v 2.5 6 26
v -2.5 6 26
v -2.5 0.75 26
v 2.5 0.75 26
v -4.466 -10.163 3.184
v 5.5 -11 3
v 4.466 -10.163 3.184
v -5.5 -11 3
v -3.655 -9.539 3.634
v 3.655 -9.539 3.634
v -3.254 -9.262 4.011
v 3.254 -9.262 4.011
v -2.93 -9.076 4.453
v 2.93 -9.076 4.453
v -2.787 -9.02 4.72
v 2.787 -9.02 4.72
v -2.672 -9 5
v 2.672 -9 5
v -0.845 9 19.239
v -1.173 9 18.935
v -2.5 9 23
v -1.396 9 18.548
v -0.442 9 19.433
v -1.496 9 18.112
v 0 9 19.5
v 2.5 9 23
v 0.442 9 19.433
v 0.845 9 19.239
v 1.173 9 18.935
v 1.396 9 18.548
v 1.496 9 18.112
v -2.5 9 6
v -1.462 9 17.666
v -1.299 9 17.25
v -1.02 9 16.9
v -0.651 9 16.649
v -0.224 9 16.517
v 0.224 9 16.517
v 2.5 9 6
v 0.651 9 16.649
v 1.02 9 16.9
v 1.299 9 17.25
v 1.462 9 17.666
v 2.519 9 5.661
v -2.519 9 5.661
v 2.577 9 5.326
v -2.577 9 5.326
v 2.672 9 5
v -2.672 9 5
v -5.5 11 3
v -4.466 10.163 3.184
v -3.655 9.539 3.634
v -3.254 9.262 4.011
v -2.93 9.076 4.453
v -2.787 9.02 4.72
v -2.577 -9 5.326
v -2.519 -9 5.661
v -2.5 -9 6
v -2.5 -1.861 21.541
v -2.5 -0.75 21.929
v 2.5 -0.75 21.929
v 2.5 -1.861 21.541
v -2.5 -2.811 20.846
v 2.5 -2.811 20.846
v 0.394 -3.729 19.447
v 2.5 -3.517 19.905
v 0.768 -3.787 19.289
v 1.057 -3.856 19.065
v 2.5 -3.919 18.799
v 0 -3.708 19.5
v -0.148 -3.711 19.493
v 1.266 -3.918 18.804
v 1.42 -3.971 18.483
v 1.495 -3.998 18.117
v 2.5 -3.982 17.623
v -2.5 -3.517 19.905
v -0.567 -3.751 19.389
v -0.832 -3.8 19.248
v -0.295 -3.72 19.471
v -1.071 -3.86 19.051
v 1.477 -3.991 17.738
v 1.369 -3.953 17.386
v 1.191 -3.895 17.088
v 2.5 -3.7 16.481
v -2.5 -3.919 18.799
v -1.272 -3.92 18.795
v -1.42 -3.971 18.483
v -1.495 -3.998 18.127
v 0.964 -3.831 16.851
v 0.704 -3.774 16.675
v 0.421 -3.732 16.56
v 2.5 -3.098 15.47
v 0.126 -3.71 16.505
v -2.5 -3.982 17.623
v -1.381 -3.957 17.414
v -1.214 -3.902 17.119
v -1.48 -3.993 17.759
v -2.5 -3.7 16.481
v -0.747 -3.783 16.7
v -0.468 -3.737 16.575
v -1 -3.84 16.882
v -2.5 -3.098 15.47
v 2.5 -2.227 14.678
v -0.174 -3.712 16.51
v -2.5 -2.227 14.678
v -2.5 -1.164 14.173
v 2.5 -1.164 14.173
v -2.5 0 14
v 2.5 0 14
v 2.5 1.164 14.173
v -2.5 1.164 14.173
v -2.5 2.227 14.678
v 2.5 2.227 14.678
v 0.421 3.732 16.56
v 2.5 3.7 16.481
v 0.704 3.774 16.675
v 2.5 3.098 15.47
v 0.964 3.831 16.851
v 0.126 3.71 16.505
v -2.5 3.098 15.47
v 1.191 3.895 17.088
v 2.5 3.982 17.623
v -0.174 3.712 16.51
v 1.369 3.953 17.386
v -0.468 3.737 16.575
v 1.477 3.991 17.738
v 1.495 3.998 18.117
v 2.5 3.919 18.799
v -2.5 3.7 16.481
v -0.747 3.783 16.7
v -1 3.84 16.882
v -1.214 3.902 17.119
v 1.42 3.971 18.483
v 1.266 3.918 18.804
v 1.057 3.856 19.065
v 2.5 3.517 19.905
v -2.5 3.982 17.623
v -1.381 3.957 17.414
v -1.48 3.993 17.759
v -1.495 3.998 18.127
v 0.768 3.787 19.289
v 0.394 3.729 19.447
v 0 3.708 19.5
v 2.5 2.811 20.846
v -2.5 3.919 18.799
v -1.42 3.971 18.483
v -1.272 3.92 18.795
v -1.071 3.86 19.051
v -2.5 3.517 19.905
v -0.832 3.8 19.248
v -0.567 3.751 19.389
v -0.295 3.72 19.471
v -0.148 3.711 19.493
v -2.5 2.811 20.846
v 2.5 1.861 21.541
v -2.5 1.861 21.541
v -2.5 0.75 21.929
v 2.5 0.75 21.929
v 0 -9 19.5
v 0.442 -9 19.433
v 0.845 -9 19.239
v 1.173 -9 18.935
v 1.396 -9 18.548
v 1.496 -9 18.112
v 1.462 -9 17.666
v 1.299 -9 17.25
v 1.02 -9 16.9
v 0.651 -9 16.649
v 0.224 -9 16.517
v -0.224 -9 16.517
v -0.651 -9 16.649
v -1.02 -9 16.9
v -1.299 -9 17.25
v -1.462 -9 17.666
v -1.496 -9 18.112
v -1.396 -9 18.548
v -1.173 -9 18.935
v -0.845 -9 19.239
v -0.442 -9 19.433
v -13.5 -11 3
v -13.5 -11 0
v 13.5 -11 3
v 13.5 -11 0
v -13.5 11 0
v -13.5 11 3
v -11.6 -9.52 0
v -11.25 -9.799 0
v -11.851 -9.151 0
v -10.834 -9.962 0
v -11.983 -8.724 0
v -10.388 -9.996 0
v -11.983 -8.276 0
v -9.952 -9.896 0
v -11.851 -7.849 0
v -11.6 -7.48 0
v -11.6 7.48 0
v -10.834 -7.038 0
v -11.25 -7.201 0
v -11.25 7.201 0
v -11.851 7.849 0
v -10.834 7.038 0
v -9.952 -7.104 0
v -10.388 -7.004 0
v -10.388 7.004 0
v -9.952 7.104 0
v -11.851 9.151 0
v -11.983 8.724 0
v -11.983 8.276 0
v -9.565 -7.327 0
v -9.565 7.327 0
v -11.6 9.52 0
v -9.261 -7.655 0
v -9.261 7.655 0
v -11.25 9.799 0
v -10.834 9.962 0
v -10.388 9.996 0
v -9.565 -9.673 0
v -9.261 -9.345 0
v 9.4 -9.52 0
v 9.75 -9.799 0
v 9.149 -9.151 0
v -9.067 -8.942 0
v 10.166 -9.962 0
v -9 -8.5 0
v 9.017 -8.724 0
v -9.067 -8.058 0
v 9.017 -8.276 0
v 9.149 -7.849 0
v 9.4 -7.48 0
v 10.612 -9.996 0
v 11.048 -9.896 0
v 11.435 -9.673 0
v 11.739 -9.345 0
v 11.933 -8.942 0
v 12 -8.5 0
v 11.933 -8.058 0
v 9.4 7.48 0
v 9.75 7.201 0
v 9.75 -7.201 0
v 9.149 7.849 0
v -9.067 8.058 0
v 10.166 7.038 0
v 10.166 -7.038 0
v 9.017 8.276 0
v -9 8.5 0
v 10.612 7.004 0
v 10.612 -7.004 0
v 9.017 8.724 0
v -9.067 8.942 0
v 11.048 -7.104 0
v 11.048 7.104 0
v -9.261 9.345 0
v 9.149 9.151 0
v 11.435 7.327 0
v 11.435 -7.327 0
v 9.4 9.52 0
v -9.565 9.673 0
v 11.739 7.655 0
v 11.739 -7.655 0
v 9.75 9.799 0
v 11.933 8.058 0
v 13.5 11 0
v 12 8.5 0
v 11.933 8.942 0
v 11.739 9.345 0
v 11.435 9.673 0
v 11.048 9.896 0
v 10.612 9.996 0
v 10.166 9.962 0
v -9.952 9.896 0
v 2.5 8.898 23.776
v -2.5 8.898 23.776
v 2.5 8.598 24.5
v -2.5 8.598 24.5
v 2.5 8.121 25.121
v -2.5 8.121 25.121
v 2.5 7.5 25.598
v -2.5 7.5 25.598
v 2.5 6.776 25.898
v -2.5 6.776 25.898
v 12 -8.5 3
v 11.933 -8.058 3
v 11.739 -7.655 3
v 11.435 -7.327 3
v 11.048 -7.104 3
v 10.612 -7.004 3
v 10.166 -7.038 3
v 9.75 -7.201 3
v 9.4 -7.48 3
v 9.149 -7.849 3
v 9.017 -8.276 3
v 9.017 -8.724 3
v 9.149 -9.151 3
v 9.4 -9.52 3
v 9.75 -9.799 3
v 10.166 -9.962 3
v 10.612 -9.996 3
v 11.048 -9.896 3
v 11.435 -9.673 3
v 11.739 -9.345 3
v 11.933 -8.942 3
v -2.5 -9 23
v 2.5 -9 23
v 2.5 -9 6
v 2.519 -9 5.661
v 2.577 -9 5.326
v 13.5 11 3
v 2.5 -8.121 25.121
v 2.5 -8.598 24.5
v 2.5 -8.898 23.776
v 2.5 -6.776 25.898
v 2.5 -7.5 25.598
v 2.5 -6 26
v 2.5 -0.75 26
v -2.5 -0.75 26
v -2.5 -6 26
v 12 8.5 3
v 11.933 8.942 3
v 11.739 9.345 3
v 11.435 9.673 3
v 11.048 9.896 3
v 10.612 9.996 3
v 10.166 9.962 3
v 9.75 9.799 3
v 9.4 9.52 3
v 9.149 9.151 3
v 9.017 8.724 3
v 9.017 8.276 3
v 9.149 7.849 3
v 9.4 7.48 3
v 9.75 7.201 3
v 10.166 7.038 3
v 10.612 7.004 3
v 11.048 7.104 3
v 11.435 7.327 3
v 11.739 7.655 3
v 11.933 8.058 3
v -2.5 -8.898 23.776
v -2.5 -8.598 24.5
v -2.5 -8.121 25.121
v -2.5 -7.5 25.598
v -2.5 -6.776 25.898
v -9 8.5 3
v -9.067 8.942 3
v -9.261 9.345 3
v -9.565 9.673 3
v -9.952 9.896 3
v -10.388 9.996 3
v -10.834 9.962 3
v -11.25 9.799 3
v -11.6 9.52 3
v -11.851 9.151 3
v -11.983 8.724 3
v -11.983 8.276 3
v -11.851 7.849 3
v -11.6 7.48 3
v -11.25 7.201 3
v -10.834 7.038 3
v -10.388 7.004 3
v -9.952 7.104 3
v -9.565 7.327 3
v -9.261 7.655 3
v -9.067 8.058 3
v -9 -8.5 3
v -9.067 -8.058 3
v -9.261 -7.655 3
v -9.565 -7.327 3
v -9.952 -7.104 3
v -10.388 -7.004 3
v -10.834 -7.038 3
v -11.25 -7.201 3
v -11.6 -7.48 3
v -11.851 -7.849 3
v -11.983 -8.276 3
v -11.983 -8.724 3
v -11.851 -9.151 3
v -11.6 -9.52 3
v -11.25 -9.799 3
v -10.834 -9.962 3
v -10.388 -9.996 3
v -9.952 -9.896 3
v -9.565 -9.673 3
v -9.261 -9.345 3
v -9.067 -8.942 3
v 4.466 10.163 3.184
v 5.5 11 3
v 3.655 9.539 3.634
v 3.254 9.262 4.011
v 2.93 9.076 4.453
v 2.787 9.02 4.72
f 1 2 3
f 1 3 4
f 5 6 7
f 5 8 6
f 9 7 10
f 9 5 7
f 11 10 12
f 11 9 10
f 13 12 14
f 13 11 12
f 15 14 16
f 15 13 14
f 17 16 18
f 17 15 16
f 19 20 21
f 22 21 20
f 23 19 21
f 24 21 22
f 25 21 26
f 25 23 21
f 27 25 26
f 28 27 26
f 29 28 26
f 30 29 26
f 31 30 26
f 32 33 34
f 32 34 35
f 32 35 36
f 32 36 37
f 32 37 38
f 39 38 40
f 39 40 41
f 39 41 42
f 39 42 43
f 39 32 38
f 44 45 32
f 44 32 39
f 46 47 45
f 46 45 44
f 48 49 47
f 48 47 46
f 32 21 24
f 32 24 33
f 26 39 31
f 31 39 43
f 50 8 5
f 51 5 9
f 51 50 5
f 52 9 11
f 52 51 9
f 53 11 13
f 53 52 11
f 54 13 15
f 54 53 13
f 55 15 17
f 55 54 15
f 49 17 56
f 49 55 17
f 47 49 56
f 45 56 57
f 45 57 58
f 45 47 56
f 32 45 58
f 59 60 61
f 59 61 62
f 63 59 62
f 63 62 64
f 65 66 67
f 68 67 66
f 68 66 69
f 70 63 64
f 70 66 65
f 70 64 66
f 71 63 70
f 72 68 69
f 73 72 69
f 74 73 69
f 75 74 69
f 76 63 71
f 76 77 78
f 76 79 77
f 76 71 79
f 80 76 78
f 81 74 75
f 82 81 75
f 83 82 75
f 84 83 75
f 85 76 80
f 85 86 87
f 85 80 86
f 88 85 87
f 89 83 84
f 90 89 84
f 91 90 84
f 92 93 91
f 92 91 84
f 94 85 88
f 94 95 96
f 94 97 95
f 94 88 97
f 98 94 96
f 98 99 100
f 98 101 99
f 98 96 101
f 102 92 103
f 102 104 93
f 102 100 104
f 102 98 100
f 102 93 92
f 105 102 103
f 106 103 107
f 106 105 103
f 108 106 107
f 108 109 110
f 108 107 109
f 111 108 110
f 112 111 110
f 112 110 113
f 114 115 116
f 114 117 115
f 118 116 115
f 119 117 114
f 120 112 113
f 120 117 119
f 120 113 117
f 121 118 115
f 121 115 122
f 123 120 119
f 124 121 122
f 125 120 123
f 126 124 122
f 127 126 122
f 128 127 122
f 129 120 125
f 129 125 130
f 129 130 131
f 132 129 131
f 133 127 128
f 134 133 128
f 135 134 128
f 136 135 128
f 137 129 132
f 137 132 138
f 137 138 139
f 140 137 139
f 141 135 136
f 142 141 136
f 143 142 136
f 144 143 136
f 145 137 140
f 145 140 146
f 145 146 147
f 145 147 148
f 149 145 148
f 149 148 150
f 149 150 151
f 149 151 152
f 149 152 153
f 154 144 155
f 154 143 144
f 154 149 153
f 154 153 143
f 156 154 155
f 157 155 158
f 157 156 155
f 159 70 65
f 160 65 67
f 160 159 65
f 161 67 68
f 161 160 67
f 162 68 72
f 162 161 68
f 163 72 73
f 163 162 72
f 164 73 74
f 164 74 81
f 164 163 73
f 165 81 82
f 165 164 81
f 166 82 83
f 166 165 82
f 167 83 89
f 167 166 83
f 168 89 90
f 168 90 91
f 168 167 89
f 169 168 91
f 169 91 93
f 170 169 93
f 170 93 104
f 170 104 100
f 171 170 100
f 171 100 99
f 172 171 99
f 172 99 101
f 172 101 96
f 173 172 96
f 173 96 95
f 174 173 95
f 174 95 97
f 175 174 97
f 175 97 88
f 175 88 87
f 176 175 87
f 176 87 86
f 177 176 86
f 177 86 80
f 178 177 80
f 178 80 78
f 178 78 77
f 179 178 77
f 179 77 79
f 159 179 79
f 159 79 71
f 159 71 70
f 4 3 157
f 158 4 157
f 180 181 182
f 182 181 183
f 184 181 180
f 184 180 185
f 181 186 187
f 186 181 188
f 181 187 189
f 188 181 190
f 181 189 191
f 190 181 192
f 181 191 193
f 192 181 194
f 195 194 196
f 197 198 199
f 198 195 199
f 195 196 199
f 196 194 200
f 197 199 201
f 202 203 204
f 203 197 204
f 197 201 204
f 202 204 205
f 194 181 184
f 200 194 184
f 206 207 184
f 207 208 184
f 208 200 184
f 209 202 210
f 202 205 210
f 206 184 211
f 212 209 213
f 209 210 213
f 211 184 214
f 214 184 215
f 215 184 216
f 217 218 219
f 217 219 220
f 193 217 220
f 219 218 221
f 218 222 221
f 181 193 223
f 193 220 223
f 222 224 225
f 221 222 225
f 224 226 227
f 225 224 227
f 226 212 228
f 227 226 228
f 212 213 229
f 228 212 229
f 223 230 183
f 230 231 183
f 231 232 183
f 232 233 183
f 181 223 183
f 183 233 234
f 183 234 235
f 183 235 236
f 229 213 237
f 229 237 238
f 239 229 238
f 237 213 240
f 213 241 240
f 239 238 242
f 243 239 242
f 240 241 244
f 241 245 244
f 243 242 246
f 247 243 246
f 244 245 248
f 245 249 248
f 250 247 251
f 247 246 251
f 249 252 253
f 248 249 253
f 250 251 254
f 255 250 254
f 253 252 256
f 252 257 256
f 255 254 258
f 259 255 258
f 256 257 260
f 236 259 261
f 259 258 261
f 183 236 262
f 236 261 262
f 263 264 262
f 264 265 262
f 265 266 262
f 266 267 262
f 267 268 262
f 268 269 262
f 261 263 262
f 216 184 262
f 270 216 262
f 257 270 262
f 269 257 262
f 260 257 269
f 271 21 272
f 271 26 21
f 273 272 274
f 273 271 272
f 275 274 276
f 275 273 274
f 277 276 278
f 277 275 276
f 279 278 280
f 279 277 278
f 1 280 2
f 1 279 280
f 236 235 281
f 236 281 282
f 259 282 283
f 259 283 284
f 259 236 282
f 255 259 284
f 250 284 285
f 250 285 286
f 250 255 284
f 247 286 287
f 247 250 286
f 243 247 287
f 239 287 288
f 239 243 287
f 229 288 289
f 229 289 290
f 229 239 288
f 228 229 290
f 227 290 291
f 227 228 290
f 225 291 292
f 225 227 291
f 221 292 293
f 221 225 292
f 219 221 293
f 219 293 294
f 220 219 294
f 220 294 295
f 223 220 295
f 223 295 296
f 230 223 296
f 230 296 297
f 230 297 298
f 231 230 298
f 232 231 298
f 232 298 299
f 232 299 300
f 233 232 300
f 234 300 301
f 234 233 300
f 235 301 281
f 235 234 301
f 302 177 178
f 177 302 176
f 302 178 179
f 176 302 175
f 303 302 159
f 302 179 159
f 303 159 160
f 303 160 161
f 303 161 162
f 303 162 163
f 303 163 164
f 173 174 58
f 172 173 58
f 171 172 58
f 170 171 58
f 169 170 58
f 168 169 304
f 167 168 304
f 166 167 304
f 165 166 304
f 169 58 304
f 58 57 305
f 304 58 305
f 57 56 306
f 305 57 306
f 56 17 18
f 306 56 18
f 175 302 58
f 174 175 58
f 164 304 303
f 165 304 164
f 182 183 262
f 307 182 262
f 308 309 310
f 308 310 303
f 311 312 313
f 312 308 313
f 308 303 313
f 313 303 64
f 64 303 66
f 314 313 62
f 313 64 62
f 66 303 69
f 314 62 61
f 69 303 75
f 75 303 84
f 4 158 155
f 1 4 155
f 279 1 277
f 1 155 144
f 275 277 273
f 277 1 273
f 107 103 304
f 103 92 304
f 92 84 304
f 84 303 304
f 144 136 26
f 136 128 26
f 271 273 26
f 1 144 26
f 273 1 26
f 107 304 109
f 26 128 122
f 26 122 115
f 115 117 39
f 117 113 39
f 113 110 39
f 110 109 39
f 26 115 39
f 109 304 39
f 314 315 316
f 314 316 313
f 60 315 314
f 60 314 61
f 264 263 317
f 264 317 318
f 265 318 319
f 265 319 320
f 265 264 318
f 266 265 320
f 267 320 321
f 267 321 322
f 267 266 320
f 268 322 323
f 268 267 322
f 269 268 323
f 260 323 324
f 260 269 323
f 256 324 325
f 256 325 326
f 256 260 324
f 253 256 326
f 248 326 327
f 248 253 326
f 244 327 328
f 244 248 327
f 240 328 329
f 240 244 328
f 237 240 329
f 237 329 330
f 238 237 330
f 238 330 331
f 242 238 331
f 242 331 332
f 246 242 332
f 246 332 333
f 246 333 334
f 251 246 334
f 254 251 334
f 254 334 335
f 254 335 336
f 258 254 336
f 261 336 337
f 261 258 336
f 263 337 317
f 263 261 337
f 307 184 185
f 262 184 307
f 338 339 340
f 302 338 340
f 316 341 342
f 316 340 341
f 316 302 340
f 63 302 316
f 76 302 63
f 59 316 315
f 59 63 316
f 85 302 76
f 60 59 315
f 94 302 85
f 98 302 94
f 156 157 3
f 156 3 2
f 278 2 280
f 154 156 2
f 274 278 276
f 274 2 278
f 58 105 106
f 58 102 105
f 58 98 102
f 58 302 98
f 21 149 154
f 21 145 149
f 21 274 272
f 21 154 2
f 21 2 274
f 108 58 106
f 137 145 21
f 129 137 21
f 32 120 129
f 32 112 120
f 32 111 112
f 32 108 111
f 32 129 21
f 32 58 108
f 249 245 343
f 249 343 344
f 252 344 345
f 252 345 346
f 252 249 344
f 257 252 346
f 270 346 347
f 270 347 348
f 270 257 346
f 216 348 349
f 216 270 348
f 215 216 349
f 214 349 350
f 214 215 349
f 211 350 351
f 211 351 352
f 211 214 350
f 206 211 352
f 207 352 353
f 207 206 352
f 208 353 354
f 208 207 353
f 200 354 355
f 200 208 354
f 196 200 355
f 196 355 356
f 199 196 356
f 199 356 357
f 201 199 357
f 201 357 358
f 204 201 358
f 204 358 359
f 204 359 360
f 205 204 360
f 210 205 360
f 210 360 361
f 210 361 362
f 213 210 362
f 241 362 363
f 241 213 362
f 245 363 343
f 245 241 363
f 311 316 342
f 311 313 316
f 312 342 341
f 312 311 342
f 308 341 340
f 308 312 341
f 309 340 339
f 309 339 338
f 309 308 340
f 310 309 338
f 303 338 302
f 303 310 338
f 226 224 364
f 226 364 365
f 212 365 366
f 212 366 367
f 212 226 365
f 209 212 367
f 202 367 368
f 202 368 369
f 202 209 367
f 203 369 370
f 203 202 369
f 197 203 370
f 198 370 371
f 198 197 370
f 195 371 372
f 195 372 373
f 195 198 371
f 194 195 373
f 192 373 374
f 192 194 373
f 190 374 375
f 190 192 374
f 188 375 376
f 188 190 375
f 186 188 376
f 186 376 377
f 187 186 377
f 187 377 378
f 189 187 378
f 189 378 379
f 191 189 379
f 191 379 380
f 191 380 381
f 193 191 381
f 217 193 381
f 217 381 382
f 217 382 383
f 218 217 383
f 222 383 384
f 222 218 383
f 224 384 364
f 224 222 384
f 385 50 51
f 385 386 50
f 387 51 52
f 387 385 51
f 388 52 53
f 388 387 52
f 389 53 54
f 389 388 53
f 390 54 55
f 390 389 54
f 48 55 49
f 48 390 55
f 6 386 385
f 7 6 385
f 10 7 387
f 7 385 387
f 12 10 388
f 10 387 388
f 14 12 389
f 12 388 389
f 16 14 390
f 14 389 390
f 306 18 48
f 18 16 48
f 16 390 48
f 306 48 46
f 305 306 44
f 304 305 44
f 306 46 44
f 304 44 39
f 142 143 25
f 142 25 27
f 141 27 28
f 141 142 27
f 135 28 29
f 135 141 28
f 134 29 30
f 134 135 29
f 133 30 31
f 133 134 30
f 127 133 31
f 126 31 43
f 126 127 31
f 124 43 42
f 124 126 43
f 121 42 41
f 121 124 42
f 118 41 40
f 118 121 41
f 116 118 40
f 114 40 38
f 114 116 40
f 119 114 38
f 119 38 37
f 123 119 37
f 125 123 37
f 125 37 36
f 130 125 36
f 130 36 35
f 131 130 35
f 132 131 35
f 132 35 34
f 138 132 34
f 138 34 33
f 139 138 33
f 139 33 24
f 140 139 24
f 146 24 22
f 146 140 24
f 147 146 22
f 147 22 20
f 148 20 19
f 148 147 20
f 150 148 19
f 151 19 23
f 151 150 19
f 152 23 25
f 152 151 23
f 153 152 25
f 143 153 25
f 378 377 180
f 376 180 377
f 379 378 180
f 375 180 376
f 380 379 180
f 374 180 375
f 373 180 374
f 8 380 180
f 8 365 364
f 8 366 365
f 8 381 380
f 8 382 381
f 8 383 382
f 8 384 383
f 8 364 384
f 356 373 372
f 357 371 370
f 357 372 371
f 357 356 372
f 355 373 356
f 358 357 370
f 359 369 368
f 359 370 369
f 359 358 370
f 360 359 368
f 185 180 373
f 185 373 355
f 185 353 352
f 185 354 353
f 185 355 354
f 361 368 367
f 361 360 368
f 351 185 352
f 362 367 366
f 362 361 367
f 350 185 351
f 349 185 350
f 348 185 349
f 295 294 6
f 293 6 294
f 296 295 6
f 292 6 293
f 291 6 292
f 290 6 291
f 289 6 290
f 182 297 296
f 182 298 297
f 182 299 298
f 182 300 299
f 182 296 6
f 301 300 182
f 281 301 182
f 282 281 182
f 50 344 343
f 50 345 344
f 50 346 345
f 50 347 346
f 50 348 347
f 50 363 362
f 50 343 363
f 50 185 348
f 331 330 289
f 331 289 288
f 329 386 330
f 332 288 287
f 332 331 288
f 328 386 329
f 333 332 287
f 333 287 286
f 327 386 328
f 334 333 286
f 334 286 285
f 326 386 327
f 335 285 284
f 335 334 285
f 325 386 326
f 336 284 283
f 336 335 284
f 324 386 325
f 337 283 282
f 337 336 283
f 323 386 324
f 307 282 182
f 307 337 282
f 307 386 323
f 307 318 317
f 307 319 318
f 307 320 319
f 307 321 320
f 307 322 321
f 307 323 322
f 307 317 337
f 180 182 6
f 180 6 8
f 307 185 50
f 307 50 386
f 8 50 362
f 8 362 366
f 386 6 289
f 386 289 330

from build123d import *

# Parameters (mm, degrees)
SKETCH1_W               = 27
SKETCH1_H               = 22
SKETCH1_R               = 1.5
BOSS_EXTRUDE1_DEPTH     = 3
SKETCH2_W               = 5
SKETCH2_H               = 18
BOSS_EXTRUDE2_DEPTH     = 23
CUT_EXTRUDE1_DEPTH      = 33.449961479
CUT_EXTRUDE1_DEPTH_BACK = 33.449961479
SKETCH3_R               = 4
CUT_EXTRUDE2_DEPTH      = 33.449961479
CUT_EXTRUDE2_DEPTH_BACK = 33.449961479
SKETCH4_W               = 9.515030356
SKETCH4_H               = 1.5
FILLET1_R               = 3
CUT_EXTRUDE3_DEPTH      = 37.636730203
CUT_EXTRUDE3_DEPTH_BACK = 37.636730203
SKETCH5_R               = 1.5
FILLET2_R               = 2
FILLET3_R               = 3


with BuildPart() as part:
    # Sketch1 → Boss-Extrude1 (new body)
    with BuildSketch(Plane.XY):
        Rectangle(SKETCH1_W, SKETCH1_H)
        with Locations((-10.5, -8.5)):
            Circle(SKETCH1_R, mode=Mode.SUBTRACT)
        with Locations((-10.5, 8.5)):
            Circle(SKETCH1_R, mode=Mode.SUBTRACT)
        with Locations((10.5, 8.5)):
            Circle(SKETCH1_R, mode=Mode.SUBTRACT)
        with Locations((10.5, -8.5)):
            Circle(SKETCH1_R, mode=Mode.SUBTRACT)
    extrude(amount=BOSS_EXTRUDE1_DEPTH)

    # Sketch2 → Boss-Extrude2 (add)
    with BuildSketch(Plane.XY.offset(3)):
        Rectangle(SKETCH2_W, SKETCH2_H)
    extrude(amount=BOSS_EXTRUDE2_DEPTH)

    # Sketch3 → Cut-Extrude1 (cut, two sides: drawn at the far end of the back side and taken through both)
    with BuildSketch(Plane(origin=(2.5, 0, 0), x_dir=(0, 0, -1), z_dir=(1, 0, 0)).offset(-CUT_EXTRUDE1_DEPTH_BACK)):
        with Locations(Location((-18, 0, 0), (0, 0, 180))):
            Circle(SKETCH3_R)
    extrude(amount=CUT_EXTRUDE1_DEPTH + CUT_EXTRUDE1_DEPTH_BACK, mode=Mode.SUBTRACT)

    # Sketch4 → Cut-Extrude2 (cut, two sides: drawn at the far end of the back side and taken through both)
    with BuildSketch(Plane(origin=(2.5, 0, 0), x_dir=(0, 0, -1), z_dir=(1, 0, 0)).offset(-CUT_EXTRUDE2_DEPTH_BACK)):
        with Locations((-21.491106051, 0)):
            Rectangle(SKETCH4_W, SKETCH4_H)
    extrude(amount=CUT_EXTRUDE2_DEPTH + CUT_EXTRUDE2_DEPTH_BACK, mode=Mode.SUBTRACT)

    # Fillet1
    fillet1_edges = [part.edges().sort_by_distance(p)[0] for p in [
        (-2.5, 0, 3),
        (2.5, 0, 3),
    ]]
    fillet(fillet1_edges, radius=FILLET1_R)

    # Sketch5 → Cut-Extrude3 (cut, two sides: drawn at the far end of the back side and taken through both)
    with BuildSketch(Plane(origin=(0, 11, 0), x_dir=(1, 0, 0), z_dir=(0, 1, 0)).offset(-CUT_EXTRUDE3_DEPTH_BACK)):
        with Locations(Location((0, -18, 0), (0, 0, 270))):
            Circle(SKETCH5_R)
    extrude(amount=CUT_EXTRUDE3_DEPTH + CUT_EXTRUDE3_DEPTH_BACK, mode=Mode.SUBTRACT)

    # Fillet2
    fillet2_edges = [part.edges().sort_by_distance(p)[0] for p in [
        (0, -9, 3),
        (0, 9, 3),
    ]]
    fillet(fillet2_edges, radius=FILLET2_R - 0.0001)  # a hair under: the kernel refuses the full size

    # Fillet3
    fillet3_edges = [part.edges().sort_by_distance(p)[0] for p in [
        (0, -9, 26),
        (0, 9, 26),
    ]]
    fillet(fillet3_edges, radius=FILLET3_R)


solid = part.part
